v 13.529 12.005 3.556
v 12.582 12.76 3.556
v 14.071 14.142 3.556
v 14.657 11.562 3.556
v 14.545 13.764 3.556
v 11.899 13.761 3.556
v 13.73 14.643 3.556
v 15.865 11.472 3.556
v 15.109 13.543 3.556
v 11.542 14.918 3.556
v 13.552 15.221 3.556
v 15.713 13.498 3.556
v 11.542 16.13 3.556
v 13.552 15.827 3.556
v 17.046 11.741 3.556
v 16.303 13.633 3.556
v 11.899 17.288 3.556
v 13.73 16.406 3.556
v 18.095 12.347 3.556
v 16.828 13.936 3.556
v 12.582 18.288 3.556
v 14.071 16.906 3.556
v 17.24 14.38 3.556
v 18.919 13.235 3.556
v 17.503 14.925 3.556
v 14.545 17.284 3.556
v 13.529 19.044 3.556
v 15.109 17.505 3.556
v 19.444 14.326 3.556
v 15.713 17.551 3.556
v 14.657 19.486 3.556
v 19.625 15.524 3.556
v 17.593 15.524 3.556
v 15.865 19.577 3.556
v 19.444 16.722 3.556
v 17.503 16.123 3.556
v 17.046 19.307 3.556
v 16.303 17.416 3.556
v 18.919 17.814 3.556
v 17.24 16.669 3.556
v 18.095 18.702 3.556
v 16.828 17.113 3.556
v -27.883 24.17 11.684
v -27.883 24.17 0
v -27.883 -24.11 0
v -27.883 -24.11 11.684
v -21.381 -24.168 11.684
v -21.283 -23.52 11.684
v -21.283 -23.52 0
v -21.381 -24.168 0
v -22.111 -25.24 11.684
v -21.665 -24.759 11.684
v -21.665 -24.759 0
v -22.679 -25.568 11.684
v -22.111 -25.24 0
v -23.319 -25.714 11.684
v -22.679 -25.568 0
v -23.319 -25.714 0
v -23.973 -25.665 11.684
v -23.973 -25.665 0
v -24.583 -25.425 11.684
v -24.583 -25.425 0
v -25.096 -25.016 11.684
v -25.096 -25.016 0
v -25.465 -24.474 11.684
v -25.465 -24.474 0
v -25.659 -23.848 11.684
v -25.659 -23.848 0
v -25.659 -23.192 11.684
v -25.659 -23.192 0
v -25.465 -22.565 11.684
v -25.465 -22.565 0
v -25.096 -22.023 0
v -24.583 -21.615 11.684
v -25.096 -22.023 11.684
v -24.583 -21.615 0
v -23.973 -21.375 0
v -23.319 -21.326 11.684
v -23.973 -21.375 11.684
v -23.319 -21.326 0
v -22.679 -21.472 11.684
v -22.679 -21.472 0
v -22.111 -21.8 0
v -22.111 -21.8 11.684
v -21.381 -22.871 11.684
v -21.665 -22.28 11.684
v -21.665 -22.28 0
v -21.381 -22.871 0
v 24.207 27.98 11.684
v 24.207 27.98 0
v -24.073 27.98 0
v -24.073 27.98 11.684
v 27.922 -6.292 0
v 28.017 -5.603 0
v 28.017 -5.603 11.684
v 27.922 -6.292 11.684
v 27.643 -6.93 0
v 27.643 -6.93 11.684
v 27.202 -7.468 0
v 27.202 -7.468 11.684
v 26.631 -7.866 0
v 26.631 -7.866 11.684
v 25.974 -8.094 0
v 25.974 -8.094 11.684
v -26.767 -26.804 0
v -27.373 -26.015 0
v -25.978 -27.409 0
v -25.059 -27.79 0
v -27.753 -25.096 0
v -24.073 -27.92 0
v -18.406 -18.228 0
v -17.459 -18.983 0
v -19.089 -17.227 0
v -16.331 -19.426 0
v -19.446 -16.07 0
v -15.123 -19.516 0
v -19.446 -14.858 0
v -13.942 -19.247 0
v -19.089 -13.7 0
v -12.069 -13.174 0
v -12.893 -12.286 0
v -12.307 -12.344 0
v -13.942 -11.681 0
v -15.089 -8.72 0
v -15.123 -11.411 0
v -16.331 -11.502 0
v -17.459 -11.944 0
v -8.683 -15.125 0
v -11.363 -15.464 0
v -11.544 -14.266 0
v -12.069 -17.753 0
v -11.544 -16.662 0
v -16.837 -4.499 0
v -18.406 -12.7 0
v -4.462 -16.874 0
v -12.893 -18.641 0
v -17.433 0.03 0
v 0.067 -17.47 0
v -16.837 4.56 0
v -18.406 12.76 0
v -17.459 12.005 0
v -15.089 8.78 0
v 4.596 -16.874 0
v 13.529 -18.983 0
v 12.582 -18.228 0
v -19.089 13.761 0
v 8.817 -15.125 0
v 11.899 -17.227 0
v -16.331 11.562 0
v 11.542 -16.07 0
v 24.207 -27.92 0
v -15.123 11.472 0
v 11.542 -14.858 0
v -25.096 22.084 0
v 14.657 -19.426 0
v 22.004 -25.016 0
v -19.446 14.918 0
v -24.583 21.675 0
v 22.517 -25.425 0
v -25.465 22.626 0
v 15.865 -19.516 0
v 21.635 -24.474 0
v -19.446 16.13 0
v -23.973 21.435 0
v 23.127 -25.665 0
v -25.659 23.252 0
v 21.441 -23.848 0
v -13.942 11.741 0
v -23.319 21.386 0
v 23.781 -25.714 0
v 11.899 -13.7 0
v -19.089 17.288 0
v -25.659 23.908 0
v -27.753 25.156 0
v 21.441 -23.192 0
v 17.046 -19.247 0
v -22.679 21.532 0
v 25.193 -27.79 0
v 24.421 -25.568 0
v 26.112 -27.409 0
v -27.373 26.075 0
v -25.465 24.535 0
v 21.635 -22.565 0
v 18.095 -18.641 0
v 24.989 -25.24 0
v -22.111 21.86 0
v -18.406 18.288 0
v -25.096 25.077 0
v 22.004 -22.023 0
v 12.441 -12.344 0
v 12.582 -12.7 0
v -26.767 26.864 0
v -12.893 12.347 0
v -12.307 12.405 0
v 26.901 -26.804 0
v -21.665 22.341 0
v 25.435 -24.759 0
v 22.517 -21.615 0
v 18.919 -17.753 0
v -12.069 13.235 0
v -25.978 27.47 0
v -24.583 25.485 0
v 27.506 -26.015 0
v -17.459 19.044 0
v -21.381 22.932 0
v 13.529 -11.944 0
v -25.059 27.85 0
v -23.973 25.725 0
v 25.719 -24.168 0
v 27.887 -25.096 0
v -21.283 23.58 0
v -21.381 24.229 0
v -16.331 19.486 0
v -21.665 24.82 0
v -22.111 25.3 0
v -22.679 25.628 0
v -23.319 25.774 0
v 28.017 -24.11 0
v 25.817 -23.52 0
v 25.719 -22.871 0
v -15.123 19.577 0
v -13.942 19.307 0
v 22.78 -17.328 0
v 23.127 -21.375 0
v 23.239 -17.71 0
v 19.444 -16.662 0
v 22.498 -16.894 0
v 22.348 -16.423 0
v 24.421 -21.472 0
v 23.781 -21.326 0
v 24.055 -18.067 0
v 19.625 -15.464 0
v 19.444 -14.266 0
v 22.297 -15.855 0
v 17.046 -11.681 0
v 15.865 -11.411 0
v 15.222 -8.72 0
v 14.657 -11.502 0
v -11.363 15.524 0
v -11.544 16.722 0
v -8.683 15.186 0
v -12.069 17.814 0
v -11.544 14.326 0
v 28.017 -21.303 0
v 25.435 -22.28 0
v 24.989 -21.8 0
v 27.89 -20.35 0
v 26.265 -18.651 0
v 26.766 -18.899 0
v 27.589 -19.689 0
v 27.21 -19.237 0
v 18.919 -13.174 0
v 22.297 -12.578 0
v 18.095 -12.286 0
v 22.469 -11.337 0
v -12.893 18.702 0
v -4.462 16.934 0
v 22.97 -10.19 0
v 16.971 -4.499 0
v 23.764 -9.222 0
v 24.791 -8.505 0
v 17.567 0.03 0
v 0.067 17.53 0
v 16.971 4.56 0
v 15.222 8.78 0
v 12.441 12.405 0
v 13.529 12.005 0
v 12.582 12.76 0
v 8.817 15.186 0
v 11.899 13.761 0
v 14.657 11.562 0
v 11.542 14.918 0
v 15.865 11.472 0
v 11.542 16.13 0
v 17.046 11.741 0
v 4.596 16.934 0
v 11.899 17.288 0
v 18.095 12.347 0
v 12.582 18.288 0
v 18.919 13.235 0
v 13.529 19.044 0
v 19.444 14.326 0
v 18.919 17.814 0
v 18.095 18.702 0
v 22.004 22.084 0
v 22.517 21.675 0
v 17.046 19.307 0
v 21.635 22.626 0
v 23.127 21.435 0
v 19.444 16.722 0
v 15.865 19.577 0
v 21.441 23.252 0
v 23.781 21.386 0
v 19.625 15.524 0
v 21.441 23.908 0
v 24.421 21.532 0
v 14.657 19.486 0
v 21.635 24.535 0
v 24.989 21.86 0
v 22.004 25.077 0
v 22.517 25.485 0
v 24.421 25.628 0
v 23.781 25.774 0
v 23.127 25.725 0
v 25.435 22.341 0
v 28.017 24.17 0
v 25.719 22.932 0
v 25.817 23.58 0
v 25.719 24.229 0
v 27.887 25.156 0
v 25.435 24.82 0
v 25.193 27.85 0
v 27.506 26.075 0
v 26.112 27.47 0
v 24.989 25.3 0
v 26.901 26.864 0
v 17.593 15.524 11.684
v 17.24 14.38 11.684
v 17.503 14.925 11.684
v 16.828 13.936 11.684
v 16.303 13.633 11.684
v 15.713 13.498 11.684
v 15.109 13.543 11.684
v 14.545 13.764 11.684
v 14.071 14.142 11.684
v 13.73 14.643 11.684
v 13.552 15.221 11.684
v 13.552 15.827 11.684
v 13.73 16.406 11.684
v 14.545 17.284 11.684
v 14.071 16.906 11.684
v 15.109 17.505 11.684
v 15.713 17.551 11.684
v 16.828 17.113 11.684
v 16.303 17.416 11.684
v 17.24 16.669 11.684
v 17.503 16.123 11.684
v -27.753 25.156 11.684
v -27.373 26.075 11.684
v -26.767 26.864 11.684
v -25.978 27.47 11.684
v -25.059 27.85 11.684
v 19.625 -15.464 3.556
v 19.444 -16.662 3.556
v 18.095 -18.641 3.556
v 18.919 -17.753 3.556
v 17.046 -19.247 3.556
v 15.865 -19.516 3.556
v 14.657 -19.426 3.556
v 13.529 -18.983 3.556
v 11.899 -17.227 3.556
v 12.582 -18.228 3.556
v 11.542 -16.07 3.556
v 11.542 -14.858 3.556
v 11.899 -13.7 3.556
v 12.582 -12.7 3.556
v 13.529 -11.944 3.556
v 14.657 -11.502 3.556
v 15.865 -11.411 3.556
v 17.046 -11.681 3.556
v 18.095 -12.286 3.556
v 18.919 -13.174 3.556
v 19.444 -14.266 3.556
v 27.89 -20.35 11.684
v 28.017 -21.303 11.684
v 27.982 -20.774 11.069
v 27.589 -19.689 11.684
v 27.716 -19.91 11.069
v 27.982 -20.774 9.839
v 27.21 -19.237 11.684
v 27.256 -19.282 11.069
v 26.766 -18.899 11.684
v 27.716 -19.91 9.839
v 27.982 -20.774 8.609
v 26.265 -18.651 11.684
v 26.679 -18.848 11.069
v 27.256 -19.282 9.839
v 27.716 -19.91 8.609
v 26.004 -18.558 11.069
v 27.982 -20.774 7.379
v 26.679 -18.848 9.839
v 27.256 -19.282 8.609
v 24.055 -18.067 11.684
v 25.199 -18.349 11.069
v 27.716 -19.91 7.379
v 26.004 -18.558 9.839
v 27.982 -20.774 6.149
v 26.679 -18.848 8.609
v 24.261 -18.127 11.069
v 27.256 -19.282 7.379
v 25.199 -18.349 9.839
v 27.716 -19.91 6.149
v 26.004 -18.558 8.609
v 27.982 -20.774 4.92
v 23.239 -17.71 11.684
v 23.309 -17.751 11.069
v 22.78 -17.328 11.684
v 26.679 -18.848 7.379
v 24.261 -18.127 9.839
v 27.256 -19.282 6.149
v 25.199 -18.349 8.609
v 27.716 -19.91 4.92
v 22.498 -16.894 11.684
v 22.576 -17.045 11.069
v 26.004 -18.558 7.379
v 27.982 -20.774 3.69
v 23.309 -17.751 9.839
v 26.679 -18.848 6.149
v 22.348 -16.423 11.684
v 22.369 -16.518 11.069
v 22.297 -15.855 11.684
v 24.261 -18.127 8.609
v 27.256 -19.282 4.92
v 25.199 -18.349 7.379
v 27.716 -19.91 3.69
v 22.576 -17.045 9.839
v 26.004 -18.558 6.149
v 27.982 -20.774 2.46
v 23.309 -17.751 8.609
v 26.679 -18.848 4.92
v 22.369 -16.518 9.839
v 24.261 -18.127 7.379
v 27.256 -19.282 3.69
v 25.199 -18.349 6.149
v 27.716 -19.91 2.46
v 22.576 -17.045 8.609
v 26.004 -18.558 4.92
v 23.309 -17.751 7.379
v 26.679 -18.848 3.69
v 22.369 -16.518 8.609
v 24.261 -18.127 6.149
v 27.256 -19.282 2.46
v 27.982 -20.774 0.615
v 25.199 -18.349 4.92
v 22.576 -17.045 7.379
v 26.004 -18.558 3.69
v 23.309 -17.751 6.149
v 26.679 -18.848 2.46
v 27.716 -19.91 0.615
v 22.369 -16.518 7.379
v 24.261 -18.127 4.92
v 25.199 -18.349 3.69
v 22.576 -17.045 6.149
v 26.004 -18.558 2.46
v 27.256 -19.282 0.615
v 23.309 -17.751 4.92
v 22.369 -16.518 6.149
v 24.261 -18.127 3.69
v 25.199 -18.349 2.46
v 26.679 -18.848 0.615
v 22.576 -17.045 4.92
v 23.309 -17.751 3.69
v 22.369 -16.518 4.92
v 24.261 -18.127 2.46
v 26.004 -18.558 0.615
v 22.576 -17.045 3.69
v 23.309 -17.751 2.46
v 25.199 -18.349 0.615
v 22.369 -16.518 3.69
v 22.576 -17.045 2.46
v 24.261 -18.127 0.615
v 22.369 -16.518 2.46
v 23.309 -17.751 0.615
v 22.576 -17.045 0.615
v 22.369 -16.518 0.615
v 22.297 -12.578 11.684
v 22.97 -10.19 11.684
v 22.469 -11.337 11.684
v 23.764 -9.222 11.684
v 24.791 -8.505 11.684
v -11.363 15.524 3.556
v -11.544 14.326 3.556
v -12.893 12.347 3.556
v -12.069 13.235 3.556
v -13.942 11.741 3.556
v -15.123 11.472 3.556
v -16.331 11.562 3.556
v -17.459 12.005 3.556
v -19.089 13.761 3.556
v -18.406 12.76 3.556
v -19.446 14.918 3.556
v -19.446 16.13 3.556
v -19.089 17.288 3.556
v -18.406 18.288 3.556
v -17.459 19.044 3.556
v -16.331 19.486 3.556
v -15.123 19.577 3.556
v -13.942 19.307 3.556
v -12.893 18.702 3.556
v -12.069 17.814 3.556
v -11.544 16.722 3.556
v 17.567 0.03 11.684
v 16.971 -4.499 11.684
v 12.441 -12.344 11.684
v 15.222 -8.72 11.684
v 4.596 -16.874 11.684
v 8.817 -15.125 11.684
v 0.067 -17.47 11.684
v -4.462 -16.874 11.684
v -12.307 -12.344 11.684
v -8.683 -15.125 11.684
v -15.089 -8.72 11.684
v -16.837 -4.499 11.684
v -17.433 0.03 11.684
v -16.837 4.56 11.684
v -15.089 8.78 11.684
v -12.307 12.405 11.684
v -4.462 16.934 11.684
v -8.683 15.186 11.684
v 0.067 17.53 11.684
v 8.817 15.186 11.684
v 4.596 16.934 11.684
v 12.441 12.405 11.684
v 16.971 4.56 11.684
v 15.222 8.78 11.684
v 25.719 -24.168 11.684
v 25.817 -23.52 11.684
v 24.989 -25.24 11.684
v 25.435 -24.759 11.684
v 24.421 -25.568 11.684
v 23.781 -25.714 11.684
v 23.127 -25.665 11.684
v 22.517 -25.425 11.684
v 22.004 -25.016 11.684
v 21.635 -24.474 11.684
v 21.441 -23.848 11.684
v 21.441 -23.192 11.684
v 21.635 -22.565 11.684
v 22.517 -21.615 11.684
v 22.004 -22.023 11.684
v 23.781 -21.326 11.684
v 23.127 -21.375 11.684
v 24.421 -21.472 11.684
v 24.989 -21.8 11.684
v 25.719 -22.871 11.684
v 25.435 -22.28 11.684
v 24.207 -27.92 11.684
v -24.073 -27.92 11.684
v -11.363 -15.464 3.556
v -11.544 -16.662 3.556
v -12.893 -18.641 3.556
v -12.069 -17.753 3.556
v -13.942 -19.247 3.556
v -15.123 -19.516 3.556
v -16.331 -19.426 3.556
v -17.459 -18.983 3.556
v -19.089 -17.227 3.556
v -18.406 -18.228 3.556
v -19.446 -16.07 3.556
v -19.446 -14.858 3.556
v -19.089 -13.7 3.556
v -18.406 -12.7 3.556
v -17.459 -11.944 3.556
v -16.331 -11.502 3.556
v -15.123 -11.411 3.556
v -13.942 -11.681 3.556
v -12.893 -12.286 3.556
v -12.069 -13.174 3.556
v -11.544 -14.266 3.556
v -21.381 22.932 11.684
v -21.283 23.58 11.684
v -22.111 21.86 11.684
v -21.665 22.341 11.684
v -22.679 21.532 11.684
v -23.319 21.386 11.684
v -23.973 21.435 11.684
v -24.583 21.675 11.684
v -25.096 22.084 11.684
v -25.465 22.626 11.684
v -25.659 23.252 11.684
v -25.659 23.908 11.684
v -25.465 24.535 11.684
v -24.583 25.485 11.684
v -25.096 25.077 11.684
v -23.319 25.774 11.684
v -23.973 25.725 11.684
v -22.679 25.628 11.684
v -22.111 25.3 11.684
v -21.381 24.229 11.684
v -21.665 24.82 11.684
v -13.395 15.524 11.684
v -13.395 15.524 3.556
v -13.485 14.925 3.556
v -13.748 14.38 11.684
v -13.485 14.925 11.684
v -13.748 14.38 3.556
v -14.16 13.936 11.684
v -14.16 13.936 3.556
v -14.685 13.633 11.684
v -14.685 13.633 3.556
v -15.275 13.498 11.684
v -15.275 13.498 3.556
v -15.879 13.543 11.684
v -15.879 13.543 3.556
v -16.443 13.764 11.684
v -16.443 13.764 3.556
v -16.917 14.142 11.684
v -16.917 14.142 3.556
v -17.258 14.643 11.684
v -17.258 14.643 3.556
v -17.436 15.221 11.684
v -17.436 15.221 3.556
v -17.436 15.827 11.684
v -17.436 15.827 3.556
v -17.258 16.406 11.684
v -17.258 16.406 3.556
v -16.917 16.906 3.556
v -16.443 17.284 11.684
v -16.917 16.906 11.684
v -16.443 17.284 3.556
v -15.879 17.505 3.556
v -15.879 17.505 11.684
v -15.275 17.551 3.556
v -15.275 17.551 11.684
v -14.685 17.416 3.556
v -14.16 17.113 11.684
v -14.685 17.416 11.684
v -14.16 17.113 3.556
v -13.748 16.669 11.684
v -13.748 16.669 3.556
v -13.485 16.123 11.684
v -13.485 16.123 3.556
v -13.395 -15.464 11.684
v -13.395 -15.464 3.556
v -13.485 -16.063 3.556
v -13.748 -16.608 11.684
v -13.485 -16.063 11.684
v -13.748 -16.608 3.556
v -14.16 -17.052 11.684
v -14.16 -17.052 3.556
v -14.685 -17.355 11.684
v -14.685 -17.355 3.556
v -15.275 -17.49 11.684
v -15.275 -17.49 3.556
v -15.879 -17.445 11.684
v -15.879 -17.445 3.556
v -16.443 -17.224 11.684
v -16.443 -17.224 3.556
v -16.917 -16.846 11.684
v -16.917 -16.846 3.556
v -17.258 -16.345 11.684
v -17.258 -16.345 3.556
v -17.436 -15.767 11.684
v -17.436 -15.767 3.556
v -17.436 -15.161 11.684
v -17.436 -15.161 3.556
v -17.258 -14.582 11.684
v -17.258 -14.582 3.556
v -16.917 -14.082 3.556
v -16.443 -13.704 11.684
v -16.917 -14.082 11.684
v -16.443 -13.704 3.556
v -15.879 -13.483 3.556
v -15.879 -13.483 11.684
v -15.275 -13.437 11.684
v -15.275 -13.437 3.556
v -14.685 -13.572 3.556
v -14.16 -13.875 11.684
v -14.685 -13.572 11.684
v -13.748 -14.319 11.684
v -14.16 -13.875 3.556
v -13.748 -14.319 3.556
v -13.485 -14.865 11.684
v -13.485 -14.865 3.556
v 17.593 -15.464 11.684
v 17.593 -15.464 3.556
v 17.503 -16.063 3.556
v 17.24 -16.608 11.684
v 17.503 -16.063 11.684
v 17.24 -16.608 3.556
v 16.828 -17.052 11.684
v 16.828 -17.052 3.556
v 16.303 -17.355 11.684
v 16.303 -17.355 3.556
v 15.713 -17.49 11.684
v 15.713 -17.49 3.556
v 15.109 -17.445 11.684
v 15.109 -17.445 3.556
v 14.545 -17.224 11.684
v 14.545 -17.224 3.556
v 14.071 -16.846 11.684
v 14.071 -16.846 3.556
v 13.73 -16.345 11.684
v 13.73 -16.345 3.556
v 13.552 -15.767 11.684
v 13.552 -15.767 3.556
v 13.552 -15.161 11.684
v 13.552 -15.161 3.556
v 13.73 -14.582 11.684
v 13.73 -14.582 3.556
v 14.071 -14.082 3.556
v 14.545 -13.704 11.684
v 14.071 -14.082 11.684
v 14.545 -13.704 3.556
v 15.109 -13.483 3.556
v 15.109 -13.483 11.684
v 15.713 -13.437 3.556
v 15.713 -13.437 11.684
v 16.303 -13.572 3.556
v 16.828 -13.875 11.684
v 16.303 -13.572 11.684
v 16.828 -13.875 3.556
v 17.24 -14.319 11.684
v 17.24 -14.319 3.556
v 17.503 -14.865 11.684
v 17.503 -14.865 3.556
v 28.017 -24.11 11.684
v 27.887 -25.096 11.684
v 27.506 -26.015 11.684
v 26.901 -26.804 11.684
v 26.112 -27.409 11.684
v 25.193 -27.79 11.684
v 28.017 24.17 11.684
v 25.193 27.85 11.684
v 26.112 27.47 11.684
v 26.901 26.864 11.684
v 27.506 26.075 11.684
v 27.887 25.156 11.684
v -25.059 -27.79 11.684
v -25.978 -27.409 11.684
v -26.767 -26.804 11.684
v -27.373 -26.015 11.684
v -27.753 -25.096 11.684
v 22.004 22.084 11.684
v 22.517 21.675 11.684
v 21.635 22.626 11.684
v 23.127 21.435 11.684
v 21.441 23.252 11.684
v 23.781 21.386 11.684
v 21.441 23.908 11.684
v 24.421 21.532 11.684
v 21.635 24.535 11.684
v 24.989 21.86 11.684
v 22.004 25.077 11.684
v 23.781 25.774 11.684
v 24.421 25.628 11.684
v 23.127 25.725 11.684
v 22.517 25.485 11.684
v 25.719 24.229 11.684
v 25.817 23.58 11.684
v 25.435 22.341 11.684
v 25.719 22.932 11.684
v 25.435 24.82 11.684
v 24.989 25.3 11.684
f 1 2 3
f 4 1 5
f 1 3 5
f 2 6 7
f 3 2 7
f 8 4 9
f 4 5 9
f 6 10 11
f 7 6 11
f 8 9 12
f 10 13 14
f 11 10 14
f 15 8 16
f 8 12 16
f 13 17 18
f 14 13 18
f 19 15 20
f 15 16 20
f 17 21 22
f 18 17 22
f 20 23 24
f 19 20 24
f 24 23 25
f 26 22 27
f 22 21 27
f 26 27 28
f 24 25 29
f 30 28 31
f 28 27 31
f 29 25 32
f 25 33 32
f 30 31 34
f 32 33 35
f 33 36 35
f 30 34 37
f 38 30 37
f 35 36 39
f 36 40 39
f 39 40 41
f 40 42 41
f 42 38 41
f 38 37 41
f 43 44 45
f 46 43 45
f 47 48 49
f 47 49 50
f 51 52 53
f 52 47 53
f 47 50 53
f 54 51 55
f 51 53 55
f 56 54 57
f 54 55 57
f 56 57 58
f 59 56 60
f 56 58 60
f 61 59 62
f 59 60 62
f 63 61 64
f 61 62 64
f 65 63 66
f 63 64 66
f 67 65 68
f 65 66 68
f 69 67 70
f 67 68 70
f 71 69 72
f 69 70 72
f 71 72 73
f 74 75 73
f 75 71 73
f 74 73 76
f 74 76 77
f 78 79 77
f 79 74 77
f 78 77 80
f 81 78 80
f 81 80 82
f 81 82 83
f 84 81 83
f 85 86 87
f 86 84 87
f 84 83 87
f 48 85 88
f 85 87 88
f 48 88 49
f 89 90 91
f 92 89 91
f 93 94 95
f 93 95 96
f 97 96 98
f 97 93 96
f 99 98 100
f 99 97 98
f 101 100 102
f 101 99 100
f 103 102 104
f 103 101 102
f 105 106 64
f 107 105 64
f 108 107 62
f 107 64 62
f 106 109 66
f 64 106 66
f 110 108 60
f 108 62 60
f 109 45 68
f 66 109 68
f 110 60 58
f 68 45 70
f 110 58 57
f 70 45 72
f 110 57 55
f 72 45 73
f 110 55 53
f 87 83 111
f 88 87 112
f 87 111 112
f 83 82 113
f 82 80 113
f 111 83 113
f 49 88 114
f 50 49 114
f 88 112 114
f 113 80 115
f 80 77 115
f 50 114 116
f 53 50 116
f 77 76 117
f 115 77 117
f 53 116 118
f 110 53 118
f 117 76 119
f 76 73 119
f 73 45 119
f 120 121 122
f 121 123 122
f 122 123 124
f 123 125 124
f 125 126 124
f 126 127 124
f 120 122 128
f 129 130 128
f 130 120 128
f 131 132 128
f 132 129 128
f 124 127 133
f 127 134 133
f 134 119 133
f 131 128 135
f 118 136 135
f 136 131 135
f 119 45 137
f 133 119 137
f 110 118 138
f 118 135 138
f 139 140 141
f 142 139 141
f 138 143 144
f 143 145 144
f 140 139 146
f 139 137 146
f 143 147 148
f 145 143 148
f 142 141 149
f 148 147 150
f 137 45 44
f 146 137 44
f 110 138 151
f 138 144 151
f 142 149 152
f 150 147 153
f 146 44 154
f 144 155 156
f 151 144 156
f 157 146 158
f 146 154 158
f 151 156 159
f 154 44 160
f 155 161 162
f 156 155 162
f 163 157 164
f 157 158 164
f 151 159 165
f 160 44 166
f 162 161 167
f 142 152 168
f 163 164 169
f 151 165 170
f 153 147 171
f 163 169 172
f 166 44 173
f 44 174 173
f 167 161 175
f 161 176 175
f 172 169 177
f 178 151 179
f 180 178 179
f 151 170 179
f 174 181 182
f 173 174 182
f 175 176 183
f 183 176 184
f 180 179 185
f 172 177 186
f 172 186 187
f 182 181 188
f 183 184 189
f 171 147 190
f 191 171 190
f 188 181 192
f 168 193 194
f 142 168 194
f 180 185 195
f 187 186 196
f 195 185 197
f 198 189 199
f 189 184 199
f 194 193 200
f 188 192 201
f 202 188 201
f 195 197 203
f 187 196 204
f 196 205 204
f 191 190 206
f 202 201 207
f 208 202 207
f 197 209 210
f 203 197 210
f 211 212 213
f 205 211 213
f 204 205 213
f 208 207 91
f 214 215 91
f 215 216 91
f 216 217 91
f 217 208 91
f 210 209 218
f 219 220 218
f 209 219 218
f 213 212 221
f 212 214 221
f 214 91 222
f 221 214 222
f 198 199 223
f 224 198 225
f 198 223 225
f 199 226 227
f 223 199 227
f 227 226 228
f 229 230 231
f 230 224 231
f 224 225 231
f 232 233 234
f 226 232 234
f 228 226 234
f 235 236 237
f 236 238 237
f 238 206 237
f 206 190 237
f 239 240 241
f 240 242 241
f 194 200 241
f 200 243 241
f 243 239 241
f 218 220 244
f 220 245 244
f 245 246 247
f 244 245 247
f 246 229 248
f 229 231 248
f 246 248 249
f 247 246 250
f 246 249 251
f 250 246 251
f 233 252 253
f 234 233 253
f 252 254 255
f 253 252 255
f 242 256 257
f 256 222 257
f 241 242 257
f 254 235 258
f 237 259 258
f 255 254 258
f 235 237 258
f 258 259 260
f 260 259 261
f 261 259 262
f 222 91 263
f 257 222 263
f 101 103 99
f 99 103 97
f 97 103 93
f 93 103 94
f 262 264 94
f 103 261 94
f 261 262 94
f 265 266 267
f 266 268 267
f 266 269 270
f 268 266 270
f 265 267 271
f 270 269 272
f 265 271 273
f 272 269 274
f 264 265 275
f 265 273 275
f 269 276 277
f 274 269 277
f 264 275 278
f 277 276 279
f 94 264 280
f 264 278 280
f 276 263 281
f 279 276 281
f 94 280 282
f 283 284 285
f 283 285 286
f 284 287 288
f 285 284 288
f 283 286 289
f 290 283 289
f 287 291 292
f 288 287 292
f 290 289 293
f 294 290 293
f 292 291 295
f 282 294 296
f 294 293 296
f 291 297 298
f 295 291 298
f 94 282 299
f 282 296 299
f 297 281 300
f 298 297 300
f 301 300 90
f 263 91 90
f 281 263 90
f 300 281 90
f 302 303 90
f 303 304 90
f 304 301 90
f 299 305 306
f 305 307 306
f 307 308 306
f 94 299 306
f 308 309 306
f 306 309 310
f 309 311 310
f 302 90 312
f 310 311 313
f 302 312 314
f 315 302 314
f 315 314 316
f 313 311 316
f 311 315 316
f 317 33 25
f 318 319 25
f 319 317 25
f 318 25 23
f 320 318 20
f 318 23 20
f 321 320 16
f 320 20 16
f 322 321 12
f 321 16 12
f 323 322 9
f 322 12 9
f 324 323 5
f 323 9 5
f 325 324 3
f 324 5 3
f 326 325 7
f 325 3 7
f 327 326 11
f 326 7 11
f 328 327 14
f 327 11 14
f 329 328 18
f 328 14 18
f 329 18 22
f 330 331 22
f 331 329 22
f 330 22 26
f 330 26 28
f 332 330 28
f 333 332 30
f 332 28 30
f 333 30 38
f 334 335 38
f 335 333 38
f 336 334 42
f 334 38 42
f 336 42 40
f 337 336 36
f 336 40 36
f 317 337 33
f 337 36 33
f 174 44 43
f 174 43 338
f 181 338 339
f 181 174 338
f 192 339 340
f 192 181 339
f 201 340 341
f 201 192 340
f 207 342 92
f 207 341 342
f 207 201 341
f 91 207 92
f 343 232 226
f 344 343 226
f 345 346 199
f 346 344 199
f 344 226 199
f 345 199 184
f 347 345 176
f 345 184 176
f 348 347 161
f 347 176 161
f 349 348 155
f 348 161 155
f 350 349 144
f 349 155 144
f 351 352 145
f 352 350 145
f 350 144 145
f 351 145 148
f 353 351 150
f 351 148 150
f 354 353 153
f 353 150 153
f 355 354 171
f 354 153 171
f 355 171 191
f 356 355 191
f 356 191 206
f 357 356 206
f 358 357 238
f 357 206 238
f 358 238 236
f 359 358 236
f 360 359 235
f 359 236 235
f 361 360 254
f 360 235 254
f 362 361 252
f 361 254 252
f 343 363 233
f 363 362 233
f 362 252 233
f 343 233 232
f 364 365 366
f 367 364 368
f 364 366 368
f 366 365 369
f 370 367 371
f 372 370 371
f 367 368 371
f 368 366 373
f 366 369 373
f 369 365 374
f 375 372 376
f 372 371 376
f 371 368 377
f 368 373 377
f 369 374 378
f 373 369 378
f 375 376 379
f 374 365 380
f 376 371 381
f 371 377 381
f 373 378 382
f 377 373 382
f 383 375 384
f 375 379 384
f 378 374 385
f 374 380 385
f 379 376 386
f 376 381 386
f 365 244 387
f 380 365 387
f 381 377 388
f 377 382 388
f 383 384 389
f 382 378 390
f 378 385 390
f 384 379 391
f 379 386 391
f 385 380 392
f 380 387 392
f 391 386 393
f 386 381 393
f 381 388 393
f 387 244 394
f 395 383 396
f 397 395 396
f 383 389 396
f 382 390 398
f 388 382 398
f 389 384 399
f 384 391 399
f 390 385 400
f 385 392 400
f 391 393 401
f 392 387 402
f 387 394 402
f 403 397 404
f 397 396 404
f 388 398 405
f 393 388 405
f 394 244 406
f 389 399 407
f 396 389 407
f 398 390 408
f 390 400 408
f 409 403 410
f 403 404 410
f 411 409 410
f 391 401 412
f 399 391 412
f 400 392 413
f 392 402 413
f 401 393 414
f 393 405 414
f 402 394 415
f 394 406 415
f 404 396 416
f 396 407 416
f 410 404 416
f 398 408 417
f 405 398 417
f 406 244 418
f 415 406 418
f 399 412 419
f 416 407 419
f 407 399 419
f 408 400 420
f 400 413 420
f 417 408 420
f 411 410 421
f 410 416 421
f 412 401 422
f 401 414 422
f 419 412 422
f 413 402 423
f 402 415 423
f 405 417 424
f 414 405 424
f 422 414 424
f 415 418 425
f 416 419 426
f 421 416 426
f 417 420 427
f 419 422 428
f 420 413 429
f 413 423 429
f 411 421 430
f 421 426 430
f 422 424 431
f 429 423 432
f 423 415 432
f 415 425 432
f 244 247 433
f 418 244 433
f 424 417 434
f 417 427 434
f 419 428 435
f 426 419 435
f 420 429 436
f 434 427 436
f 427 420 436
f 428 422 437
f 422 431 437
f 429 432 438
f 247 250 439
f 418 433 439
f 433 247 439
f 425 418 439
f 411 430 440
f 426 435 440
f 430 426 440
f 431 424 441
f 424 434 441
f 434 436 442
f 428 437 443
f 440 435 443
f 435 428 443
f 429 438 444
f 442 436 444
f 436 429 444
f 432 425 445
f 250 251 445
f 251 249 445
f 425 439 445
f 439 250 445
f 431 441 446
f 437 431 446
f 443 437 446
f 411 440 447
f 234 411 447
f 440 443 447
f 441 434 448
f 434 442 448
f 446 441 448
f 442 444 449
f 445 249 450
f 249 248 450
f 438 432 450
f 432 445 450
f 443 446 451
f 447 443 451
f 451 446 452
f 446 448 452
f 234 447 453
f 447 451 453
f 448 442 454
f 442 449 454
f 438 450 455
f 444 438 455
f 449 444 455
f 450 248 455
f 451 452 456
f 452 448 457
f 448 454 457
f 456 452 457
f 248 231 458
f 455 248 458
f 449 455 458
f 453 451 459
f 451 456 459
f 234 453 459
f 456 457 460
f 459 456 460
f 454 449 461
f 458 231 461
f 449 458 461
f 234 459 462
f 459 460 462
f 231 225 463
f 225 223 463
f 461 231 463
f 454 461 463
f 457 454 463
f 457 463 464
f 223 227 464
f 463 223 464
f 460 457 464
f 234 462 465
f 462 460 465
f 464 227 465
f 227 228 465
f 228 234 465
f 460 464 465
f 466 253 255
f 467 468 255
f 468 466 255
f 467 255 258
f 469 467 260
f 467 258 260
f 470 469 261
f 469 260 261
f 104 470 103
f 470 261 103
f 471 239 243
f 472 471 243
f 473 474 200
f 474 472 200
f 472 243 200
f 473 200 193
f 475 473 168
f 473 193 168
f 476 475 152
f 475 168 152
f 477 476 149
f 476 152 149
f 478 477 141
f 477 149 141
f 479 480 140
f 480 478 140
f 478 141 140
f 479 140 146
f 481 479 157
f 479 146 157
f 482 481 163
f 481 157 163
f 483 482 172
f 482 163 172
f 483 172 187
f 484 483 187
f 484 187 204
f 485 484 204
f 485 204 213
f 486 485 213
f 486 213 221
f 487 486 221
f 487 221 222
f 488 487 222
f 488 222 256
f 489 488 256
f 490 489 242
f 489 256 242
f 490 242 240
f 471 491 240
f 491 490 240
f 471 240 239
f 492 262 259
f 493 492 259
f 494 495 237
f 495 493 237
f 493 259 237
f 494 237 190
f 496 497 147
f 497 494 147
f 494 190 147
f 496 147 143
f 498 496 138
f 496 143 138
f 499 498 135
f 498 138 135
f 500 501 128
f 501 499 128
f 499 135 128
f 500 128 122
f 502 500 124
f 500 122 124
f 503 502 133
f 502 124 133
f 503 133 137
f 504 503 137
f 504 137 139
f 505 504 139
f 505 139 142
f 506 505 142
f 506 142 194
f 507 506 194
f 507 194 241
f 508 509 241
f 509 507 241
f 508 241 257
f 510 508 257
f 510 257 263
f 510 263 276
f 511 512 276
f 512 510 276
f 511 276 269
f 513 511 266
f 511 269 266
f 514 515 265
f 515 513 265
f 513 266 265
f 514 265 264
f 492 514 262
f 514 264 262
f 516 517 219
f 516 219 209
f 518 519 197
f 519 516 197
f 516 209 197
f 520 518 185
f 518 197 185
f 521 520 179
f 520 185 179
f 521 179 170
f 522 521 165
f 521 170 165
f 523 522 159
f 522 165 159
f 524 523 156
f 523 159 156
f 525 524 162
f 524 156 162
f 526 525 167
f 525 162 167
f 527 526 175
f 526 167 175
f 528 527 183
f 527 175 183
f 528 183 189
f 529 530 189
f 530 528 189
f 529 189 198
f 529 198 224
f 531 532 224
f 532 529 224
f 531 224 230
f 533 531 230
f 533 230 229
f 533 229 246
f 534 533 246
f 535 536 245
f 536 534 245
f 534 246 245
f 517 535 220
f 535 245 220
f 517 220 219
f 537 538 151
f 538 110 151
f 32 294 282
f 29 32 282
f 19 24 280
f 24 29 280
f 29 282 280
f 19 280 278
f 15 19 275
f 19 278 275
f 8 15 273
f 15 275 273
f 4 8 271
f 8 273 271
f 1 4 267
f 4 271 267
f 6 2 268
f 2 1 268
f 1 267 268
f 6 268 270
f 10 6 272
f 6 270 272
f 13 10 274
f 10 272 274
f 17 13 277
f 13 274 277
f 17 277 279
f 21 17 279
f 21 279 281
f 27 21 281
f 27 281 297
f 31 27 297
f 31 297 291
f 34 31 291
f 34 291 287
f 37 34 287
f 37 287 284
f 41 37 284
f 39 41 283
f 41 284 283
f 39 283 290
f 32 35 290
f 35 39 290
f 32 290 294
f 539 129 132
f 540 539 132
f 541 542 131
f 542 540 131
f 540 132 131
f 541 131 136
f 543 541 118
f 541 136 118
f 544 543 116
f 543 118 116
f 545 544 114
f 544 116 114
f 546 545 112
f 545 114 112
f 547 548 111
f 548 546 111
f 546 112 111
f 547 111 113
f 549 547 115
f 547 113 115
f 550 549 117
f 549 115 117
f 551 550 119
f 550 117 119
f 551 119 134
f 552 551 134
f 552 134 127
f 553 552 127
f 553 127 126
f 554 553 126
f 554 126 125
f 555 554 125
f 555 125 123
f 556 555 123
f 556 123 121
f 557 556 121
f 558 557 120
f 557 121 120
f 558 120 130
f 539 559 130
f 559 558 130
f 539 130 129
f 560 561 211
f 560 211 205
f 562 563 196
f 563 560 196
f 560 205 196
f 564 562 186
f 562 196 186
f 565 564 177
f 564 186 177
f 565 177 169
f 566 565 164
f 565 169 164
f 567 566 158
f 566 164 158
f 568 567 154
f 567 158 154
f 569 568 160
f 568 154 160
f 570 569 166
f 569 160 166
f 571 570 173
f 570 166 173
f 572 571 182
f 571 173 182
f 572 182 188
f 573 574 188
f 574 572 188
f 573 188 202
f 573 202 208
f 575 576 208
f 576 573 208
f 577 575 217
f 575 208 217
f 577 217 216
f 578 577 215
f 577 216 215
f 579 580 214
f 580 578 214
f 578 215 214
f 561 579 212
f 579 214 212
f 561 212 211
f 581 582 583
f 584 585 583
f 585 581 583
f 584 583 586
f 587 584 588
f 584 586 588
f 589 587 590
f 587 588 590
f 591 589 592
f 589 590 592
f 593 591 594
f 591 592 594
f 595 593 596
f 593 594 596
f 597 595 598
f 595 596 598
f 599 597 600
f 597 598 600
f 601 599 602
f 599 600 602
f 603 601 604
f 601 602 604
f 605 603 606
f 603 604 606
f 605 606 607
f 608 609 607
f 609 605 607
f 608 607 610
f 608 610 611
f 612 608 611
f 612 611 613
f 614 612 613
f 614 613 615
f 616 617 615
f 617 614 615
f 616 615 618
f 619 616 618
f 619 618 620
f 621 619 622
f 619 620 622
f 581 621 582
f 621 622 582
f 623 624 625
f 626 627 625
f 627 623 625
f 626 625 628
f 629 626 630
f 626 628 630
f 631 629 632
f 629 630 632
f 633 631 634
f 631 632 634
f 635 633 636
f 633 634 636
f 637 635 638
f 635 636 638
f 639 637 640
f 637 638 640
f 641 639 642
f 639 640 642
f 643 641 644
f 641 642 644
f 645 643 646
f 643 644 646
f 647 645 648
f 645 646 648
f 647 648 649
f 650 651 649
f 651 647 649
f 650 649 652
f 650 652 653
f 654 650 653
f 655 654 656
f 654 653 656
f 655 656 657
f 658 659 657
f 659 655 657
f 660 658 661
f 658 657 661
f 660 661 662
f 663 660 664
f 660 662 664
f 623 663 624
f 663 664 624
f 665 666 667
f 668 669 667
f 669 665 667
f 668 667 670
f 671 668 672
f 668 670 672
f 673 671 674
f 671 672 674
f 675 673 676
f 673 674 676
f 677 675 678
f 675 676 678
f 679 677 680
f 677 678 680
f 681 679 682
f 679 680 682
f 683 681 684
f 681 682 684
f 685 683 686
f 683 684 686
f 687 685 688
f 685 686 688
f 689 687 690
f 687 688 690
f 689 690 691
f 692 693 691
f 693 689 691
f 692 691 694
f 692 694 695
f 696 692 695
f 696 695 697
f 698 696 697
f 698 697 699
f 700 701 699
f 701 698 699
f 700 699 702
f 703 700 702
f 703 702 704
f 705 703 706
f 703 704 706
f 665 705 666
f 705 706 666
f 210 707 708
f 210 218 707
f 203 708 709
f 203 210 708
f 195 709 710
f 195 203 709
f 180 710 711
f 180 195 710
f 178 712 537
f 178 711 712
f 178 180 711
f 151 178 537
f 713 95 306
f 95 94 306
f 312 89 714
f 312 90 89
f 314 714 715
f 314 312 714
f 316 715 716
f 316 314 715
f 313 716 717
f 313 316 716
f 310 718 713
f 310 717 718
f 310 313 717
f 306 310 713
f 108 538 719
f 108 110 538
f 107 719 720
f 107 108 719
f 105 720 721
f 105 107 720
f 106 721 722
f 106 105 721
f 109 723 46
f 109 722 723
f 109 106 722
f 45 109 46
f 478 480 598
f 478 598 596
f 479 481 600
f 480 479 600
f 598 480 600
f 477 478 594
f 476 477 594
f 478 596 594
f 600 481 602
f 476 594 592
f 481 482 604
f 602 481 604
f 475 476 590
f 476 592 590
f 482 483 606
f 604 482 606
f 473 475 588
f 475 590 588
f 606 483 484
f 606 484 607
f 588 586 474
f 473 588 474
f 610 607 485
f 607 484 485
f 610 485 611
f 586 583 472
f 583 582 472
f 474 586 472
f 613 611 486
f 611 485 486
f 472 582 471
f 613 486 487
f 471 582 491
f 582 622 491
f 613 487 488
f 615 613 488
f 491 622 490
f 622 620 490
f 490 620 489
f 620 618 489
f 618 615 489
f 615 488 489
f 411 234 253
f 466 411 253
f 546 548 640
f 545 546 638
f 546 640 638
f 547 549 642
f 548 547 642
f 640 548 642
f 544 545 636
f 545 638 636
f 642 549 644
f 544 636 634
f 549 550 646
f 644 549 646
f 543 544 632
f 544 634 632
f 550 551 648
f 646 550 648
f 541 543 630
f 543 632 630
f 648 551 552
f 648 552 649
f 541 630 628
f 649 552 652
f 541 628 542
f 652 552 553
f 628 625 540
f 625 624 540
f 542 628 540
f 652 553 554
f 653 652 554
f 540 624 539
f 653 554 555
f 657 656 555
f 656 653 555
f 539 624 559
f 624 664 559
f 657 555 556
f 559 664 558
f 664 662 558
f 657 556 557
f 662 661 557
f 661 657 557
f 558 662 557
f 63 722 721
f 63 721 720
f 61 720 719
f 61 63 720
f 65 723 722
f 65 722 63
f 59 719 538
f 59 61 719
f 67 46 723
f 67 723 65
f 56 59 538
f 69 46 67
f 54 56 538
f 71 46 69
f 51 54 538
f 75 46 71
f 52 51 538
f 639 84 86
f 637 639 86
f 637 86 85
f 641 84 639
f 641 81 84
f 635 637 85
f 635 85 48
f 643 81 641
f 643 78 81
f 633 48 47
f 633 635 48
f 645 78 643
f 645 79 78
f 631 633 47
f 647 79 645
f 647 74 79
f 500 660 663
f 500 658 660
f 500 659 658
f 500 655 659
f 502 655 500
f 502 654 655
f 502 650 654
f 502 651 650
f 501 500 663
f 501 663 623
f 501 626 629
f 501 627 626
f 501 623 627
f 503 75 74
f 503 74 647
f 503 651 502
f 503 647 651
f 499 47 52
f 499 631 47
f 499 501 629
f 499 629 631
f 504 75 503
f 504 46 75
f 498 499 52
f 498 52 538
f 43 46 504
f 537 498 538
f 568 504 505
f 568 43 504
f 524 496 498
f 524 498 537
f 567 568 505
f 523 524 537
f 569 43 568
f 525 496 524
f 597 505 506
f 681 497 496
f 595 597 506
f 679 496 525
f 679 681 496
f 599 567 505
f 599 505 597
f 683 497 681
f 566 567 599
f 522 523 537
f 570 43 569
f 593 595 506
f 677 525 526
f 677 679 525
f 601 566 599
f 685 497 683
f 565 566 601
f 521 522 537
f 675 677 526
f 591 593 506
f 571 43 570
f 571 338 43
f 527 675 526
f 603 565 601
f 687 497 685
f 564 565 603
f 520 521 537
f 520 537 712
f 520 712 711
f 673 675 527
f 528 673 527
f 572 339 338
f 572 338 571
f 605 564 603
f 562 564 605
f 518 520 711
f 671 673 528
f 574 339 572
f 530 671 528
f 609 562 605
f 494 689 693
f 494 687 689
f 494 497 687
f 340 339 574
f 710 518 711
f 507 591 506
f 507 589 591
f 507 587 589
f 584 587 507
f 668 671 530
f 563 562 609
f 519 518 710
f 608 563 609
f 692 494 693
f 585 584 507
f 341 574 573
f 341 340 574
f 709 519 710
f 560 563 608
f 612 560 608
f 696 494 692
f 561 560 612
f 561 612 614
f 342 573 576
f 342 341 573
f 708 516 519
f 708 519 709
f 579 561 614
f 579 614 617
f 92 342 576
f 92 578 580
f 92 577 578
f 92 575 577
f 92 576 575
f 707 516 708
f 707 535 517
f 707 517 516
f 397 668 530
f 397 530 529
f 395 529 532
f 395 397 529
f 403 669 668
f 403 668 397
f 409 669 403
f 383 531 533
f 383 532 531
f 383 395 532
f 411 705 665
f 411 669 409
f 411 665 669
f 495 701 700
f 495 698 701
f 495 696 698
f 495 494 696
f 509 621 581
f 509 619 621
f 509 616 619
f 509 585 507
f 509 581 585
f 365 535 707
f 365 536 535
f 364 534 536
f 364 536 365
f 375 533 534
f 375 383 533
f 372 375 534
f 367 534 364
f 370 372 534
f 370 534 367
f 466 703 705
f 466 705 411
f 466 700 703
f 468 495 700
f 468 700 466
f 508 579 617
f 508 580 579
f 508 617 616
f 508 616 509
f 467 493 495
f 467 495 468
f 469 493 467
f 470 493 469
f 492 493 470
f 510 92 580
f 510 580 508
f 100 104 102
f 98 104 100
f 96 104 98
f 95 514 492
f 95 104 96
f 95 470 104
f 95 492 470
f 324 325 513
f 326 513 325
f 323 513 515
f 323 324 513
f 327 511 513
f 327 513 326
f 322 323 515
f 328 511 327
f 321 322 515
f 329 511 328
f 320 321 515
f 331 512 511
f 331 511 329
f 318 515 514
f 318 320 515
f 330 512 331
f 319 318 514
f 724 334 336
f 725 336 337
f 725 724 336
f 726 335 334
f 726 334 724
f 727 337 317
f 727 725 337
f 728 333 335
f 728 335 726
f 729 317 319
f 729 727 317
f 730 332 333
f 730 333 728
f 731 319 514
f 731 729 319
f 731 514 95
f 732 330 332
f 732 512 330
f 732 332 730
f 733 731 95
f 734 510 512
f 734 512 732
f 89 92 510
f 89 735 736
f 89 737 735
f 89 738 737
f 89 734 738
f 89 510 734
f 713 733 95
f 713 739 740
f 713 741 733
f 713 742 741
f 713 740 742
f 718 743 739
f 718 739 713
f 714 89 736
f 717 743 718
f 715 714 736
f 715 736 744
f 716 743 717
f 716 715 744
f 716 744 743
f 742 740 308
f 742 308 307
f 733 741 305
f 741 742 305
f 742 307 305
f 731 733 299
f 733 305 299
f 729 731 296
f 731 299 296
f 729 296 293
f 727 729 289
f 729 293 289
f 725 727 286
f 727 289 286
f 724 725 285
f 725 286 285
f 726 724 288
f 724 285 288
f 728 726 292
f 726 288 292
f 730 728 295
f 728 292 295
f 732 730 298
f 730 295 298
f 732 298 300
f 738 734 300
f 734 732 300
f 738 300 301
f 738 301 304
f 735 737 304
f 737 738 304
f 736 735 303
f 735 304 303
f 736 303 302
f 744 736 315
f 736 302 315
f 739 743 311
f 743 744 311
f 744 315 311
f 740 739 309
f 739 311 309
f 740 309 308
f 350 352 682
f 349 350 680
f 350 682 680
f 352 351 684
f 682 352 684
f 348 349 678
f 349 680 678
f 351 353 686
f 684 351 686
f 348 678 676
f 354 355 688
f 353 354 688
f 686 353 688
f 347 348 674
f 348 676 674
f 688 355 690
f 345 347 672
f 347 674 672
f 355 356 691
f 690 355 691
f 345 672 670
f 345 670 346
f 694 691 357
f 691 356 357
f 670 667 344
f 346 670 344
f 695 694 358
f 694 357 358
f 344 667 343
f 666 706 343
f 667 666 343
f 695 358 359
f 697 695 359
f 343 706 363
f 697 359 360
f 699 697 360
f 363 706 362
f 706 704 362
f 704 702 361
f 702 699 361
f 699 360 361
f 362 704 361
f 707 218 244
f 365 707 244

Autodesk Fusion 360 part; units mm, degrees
sketch "Sketch1" plane through (0, 0, 0) normal (0, 0, 1) x (1, 0, 0)
  line L0 (-27.8831, 24.1702) -> (-27.8831, -24.1098)
  circle A0 centre (23.6169, -23.5198) radius 2.2
  arc A1 (24.2069, -27.9198) -> (28.0169, -24.1098) centre (24.2069, -24.1098) ccw
  line L1 (-24.0731, -27.9198) -> (24.2069, -27.9198)
  circle A2 centre (23.6169, 23.5802) radius 2.2
  line L2 (24.2069, 27.9802) -> (-24.0731, 27.9802)
  spline S0 degree 5 poles (28.0169, -21.3028) (28.0169, -21.1603) (28.0055, -20.8859) (27.9539, -20.5067) (27.8203, -20.0644) (27.5661, -19.6103) (27.2491, -19.2452) (26.8901, -18.9576) (26.4983, -18.7351) (26.0664, -18.5646) (25.5813, -18.4304) (25.0343, -18.3121) (24.4296, -18.1826) (23.7979, -18.0051) (23.1967, -17.7339) (22.6942, -17.3216) (22.4247, -16.8443) (22.3203, -16.389) (22.2971, -16.0405) (22.2971, -15.8549) knots -1 -1 -1 -1 -1 -1 -0.933333 -0.866667 -0.8 -0.733333 -0.666667 -0.6 -0.533333 -0.466667 -0.4 -0.333333 -0.266667 -0.2 -0.133333 -0.066667 0 0 0 0 0 0
  circle A3 centre (-23.4831, 23.5802) radius 2.2
  arc A4 (25.9741, -8.0941) -> (28.0169, -5.6032) centre (25.4769, -5.6032) ccw
  arc A5 (25.9741, -8.0941) -> (22.2971, -12.5777) centre (26.8691, -12.5777) ccw
  circle A6 centre (0.0669, 0.0302) radius 17.5
  arc A7 (-24.0731, 27.9802) -> (-27.8831, 24.1702) centre (-24.0731, 24.1702) ccw
  line L3 (22.2971, -15.8549) -> (22.2971, -12.5777)
  arc A8 (28.0169, 24.1702) -> (24.2069, 27.9802) centre (24.2069, 24.1702) ccw
  line L4 (28.0169, -5.6032) -> (28.0169, 24.1702)
  circle A9 centre (-23.4831, -23.5198) radius 2.2
  arc A10 (-27.8831, -24.1098) -> (-24.0731, -27.9198) centre (-24.0731, -24.1098) ccw
  line L5 (28.0169, -24.1098) -> (28.0169, -21.3028)
  circle A11 centre (-15.4271, 15.5242) radius 2.032
  circle A12 centre (15.5609, 15.5242) radius 2.032
  circle A13 centre (15.5609, -15.4638) radius 2.032
  circle A14 centre (-15.4271, -15.4638) radius 2.032
  circle A15 centre (-15.4271, -15.4638) radius 4.064
  circle A16 centre (15.5609, -15.4638) radius 4.064
  circle A17 centre (15.5609, 15.5242) radius 4.064
  circle A18 centre (-15.4271, 15.5242) radius 4.064
  dimension "d1" = 4.064
  dimension "d2" = 4.064
  dimension "d3" = 4.064
  dimension "d4" = 4.064
  dimension "d7" = 8.128
  dimension "d8" = 8.128
  dimension "d9" = 8.128
  dimension "d10" = 8.128
extrude "Extrude1" add sketch "Sketch1" along normal blind 11.684 contours L0 A1 L1 L2 S0 A4 A5 A7 L3 A8 L4 A10 L5 | A15 | A16 | A17 | A18
extrude "Extrude2" cut sketch "Sketch1" along normal blind 3.556 contours A15 | A16 | A17 | A18
